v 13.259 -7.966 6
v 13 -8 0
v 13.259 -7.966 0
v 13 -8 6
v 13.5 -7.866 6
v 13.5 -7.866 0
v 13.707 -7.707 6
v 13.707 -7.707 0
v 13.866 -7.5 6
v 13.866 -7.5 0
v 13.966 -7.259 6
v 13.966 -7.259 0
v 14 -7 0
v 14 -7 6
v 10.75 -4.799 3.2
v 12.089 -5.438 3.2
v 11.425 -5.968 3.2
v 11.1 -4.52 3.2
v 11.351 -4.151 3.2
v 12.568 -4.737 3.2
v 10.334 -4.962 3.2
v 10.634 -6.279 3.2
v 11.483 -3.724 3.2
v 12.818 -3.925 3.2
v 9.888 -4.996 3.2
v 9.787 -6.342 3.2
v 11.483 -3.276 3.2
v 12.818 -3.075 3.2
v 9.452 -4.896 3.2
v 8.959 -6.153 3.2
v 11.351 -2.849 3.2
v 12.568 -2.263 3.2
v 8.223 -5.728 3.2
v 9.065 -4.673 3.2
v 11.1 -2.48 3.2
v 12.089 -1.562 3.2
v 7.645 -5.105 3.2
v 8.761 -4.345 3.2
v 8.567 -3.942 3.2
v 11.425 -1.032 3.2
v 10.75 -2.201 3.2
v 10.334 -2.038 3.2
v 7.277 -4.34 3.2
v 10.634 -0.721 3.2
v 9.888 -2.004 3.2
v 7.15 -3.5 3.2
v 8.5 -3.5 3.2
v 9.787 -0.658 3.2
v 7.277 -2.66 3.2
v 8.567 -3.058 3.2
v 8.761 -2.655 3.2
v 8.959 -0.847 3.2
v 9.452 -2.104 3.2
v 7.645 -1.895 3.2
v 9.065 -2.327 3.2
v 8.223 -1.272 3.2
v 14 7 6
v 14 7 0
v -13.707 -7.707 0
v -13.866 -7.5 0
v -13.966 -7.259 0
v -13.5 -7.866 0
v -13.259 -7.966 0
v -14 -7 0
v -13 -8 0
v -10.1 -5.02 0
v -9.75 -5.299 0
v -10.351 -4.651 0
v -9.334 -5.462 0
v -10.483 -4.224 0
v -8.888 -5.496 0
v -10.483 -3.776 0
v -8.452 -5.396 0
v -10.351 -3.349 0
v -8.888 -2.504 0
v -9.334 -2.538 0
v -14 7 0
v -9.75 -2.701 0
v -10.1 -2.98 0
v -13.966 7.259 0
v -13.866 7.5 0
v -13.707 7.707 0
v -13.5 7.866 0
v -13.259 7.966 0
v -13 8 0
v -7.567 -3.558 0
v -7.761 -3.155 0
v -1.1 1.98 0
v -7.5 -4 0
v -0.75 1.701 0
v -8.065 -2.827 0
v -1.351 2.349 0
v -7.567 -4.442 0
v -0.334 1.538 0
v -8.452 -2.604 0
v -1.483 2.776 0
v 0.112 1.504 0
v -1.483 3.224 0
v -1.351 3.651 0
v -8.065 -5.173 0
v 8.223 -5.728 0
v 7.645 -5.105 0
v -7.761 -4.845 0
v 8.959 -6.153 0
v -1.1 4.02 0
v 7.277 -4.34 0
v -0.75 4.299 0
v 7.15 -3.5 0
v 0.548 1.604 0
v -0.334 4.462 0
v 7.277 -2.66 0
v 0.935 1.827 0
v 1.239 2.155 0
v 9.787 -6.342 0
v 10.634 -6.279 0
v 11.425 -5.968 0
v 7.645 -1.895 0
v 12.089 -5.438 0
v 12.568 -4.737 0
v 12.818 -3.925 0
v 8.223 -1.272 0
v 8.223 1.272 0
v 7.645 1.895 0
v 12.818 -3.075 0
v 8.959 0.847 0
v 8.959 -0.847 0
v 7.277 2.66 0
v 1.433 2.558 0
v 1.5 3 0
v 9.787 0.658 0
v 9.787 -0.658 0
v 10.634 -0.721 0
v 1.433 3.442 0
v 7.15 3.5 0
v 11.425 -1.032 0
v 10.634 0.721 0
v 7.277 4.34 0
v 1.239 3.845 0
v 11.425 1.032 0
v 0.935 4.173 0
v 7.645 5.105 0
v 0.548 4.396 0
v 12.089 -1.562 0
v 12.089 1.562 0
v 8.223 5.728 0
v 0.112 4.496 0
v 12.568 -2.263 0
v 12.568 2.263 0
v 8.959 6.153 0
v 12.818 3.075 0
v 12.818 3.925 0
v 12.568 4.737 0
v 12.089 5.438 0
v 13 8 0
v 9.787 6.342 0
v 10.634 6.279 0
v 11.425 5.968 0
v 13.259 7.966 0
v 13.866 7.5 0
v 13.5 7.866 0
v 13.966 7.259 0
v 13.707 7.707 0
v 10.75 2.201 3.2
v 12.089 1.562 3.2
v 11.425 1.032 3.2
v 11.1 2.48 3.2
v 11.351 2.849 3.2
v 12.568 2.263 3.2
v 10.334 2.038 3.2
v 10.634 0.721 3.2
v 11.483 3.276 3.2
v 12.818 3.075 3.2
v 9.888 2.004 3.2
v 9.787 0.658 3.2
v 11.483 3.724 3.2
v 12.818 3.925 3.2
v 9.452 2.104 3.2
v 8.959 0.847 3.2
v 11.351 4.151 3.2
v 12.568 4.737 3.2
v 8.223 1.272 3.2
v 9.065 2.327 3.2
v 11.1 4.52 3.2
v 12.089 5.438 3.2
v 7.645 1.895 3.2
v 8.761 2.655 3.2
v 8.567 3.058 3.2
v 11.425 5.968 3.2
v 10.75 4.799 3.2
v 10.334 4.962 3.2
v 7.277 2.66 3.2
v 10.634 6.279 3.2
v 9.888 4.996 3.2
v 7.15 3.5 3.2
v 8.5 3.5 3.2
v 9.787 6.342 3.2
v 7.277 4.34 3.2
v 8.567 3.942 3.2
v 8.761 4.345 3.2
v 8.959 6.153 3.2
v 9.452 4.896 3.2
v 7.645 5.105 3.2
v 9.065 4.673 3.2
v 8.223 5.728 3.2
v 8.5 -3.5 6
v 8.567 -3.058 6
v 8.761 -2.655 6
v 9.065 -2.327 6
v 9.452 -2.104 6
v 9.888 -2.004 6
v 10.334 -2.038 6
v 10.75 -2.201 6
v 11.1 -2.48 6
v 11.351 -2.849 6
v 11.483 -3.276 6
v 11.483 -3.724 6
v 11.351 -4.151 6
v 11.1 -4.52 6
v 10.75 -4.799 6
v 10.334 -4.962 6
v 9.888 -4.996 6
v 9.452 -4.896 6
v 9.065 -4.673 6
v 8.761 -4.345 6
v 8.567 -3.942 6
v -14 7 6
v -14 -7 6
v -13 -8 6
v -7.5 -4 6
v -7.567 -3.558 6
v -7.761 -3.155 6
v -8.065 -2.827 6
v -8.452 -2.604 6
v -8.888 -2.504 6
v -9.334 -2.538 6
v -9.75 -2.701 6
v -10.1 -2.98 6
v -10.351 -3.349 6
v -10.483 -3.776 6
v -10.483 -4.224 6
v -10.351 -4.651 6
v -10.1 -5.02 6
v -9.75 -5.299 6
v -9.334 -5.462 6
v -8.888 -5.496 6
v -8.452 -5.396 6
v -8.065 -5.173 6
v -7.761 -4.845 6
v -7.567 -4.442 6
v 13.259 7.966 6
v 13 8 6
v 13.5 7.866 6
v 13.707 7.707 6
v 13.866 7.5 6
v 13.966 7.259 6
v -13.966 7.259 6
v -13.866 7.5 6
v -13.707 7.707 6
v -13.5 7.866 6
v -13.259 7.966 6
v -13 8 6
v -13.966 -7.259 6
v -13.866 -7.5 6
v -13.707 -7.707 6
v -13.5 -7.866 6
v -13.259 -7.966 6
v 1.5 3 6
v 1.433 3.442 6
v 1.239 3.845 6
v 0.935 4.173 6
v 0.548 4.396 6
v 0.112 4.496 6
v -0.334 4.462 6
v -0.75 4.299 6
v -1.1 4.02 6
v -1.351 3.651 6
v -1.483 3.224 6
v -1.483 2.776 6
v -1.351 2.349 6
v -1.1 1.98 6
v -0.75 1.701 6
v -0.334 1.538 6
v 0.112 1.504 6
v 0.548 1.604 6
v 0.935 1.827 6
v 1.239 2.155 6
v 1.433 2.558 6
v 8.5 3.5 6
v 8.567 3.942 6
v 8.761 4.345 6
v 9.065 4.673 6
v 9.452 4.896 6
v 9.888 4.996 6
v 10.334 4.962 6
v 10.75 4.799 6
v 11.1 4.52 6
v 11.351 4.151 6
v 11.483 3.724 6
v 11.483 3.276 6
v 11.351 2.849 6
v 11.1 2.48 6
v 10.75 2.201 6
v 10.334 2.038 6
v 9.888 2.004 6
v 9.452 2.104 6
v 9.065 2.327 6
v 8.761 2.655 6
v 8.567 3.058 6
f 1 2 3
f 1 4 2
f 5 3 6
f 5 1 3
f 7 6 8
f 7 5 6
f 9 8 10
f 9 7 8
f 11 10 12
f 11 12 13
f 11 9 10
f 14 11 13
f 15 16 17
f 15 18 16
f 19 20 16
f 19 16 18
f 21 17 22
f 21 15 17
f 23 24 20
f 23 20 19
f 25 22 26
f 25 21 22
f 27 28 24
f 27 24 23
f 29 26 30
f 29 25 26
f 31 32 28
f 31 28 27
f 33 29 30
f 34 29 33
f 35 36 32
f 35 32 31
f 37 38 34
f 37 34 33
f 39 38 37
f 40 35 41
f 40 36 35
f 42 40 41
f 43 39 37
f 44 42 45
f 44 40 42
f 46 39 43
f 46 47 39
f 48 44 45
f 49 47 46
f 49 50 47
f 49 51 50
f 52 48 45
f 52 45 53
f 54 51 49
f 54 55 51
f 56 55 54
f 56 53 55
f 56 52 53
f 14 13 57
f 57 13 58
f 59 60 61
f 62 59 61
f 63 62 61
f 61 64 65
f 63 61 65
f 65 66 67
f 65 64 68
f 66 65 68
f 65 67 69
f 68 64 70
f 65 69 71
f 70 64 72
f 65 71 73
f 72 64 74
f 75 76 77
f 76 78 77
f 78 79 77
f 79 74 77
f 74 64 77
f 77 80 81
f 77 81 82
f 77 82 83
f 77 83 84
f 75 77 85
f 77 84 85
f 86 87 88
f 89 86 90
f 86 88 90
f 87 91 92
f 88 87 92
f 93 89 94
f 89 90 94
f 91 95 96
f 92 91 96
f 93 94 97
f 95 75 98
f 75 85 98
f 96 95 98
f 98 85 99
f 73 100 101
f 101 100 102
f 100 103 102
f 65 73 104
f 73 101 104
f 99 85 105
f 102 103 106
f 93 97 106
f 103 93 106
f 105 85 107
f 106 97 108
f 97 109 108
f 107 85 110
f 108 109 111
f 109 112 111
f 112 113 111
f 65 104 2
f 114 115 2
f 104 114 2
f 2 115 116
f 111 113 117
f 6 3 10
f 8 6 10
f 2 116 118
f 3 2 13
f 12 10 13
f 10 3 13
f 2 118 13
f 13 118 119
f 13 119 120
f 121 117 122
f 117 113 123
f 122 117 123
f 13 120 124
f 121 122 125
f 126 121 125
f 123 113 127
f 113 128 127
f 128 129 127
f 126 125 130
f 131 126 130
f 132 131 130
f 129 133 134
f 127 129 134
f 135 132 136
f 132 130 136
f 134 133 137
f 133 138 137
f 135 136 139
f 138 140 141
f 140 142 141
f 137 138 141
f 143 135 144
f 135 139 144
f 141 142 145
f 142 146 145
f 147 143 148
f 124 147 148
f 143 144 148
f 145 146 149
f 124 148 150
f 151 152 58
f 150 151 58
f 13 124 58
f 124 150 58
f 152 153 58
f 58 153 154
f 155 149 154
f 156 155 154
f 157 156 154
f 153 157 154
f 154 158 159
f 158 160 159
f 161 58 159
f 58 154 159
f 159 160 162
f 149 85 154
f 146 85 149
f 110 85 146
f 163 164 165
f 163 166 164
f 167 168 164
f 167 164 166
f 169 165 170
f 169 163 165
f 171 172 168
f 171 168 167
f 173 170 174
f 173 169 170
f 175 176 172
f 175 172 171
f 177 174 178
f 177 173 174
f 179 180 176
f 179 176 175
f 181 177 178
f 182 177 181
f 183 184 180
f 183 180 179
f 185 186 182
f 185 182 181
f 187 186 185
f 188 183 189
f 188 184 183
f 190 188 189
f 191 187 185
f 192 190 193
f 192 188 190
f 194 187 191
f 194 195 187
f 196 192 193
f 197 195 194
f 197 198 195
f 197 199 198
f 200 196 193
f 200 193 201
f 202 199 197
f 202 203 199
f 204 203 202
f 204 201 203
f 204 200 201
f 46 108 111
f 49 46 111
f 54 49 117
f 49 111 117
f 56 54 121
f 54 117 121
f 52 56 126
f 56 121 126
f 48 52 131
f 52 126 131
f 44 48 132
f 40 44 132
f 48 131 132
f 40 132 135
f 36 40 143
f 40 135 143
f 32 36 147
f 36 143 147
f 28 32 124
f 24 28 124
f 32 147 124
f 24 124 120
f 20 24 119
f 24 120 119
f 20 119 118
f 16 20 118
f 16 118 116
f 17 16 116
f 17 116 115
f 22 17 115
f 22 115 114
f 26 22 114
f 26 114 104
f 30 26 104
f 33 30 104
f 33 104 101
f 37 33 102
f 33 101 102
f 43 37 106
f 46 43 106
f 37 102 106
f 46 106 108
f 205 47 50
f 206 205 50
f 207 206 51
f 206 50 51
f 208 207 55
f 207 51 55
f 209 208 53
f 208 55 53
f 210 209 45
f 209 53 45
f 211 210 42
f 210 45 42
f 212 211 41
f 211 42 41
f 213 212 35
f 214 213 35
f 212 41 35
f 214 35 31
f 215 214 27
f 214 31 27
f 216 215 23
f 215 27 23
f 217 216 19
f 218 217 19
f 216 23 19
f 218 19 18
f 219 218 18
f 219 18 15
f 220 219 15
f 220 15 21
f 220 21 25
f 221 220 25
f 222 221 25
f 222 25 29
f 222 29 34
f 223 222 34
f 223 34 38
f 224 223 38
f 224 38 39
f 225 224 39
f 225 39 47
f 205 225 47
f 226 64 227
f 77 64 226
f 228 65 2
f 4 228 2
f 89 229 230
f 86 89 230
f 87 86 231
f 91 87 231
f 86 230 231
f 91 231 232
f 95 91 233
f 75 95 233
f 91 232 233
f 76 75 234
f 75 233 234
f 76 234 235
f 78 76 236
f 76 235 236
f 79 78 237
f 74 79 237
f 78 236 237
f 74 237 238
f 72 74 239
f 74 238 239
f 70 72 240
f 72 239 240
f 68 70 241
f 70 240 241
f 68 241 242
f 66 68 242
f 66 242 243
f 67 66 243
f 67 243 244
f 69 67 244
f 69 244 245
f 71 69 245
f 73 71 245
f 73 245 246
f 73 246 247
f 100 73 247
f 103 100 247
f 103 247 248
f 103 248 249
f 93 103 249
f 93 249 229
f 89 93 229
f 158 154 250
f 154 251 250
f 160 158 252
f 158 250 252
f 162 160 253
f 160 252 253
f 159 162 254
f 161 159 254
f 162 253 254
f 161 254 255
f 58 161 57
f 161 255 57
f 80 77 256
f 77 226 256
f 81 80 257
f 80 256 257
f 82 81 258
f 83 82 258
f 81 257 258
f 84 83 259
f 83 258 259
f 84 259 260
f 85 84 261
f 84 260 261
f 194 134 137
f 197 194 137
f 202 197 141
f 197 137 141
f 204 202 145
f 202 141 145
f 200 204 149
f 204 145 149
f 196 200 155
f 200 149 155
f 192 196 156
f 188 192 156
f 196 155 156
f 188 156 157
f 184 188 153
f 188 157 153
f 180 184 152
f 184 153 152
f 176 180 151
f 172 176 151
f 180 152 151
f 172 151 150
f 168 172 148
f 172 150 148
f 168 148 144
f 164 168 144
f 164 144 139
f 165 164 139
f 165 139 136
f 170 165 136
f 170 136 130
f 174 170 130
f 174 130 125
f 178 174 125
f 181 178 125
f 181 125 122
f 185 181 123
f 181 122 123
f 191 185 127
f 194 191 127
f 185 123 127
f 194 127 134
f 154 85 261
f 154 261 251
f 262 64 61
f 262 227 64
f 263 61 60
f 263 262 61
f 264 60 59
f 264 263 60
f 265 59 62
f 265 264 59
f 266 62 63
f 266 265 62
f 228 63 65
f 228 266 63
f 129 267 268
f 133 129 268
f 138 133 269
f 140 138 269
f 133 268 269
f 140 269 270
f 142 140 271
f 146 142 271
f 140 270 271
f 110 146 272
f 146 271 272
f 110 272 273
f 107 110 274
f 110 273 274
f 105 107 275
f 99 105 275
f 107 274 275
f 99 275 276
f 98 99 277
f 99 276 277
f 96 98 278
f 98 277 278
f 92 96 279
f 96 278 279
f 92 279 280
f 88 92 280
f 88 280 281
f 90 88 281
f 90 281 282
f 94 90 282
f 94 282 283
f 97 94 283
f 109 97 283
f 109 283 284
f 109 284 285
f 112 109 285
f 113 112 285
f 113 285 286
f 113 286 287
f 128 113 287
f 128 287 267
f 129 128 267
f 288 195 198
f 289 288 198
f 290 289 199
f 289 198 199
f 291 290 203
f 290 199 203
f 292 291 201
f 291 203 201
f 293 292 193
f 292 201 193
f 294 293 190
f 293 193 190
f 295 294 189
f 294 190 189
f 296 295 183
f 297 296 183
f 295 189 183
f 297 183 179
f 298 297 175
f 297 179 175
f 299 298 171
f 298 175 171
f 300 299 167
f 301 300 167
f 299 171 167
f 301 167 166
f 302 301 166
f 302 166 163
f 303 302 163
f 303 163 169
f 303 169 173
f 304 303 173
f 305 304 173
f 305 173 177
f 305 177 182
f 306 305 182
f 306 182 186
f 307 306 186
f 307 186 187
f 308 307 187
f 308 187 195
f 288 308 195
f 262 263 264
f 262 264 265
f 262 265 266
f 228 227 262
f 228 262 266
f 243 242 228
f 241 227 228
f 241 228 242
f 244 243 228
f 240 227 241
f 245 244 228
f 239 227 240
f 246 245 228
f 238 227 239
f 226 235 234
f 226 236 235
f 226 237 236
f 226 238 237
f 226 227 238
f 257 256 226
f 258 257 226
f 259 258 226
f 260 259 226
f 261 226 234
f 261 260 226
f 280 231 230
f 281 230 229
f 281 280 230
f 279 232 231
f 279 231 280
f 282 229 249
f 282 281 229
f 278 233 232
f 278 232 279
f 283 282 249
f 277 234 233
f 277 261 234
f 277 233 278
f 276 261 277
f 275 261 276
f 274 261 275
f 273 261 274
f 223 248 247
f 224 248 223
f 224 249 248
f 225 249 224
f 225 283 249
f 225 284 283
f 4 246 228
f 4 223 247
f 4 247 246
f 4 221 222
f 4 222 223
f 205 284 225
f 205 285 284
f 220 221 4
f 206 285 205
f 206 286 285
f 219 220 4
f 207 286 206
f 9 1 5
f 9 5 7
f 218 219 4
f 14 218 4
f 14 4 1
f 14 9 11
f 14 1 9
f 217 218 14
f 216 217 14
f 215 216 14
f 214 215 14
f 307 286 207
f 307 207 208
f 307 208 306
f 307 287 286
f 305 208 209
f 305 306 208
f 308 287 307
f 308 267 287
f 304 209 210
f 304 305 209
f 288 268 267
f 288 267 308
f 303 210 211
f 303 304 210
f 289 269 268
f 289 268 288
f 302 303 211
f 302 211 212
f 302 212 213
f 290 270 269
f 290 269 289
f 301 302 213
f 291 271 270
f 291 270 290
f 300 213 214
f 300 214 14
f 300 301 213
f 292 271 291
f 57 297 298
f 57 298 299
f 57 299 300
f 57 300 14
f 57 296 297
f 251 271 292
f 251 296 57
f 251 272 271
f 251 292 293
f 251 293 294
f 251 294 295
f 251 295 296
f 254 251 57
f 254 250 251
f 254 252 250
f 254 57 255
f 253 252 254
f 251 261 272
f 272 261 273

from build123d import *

# Parameters (mm, degrees)
SKETCH_1_W          = 28
SKETCH_1_H          = 16
EXTRUDE_1_DEPTH     = 6
SKETCH_2_R          = 2.85
CUT_EXTRUDE_1_DEPTH = 3.2
SKETCH_3_R          = 1.5
CUT_EXTRUDE_2_DEPTH = 3.2
FILLET_1_R          = 1
SKETCH_4_R          = 1.5
CUT_EXTRUDE_3_DEPTH = 10


with BuildPart() as part:
    # 草图1 → 凸台-拉伸1 (new body)
    with BuildSketch(Plane.XY):
        Rectangle(SKETCH_1_W, SKETCH_1_H)
    extrude(amount=EXTRUDE_1_DEPTH)

    # 草图2 → 切除-拉伸1 (cut)
    with BuildSketch(Plane(origin=(0, 0, 0), x_dir=(-1, 0, 0), z_dir=(0, 0, -1))):
        with Locations((-10, 3.5)):
            Circle(SKETCH_2_R)
        with Locations((-10, -3.5)):
            Circle(SKETCH_2_R)
    extrude(amount=-CUT_EXTRUDE_1_DEPTH, mode=Mode.SUBTRACT)

    # 草图3 → 切除-拉伸2 (cut)
    with BuildSketch(Plane(origin=(0, 0, 3.2), x_dir=(-1, 0, 0), z_dir=(0, 0, -1))):
        with Locations((-10, 3.5)):
            Circle(SKETCH_3_R)
        with Locations((-10, -3.5)):
            Circle(SKETCH_3_R)
    extrude(amount=-CUT_EXTRUDE_2_DEPTH, mode=Mode.SUBTRACT)

    # 圆角1
    fillet_1_edges = [part.edges().sort_by_distance(p)[0] for p in [
        (-14, 8, 3),
        (14, 8, 3),
        (14, -8, 3),
        (-14, -8, 3),
    ]]
    fillet(fillet_1_edges, radius=FILLET_1_R)

    # 草图4 → 切除-拉伸3 (cut)
    with BuildSketch(Plane.XY.offset(6)):
        with Locations((0, 3)):
            Circle(SKETCH_4_R)
        with Locations((-9, -4)):
            Circle(SKETCH_4_R)
    extrude(amount=-CUT_EXTRUDE_3_DEPTH, mode=Mode.SUBTRACT)


solid = part.part
